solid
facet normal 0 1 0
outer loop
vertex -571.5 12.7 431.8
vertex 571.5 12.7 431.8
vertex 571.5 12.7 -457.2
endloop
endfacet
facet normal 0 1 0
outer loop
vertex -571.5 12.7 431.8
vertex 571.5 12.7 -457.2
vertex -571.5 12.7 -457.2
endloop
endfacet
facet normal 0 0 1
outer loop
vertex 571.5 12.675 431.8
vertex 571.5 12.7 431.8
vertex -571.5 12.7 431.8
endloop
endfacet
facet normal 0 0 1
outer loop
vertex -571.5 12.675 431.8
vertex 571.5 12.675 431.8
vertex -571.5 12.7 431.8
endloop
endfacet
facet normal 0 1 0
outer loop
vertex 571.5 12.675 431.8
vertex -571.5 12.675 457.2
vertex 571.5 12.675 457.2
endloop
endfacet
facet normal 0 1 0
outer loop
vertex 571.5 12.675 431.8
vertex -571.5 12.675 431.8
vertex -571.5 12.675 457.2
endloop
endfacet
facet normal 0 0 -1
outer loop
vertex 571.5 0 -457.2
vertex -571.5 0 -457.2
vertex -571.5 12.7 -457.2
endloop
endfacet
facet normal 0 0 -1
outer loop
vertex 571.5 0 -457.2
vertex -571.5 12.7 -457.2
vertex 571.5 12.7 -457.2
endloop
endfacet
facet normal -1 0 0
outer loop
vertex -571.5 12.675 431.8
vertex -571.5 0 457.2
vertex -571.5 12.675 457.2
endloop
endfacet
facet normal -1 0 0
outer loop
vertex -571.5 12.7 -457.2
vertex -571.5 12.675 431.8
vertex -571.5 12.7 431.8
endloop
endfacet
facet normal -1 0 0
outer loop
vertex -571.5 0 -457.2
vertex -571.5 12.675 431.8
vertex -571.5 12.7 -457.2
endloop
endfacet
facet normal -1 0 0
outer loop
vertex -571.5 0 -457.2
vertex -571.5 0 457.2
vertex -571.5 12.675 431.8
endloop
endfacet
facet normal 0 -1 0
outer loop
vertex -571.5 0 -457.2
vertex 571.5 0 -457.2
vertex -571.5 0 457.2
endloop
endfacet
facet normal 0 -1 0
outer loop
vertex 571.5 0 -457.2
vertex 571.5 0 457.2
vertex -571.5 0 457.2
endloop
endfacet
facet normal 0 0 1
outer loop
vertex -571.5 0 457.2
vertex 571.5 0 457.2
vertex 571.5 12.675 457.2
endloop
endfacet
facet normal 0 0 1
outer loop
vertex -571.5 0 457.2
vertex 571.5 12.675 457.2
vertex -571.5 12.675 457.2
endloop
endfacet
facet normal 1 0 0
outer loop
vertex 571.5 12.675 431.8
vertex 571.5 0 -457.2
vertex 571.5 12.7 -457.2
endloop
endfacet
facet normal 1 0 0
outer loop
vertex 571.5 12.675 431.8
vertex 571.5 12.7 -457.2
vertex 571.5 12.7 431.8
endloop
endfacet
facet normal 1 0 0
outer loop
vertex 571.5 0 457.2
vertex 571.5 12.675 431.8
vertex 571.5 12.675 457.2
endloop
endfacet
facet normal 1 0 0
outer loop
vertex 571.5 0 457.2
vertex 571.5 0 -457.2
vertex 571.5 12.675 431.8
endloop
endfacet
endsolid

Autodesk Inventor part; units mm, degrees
ref_plane "YZ Plane" through (0, 0, 0) normal (1, 0, 0) x (0, 1, 0)
ref_plane "XZ Plane" through (0, 0, 0) normal (0, 1, 0) x (-1, 0, 0)
ref_plane "XY Plane" through (0, 0, 0) normal (0, 0, 1) x (1, 0, 0)
sketch "Sketch1" plane through (0, 0, 0) normal (0, 1, 0) x (-1, 0, 0)
  line L0 (-571.5, 457.2) -> (571.5, 457.2)
  line L1 (571.5, 457.2) -> (571.5, -457.2)
  line L2 (571.5, -457.2) -> (-571.5, -457.2)
  line L3 (-571.5, -457.2) -> (-571.5, 457.2)
  line L4 (-571.5, 457.2) -> (571.5, -457.2) construction
  line L5 (571.5, 457.2) -> (-571.5, -457.2) construction
  point P0 (0, 0)
  dimension "d0" = 1143
  dimension "d1" = 914.4
extrude "Extrusion1" add sketch "Sketch1" along normal blind 12.7
sketch "Sketch2" plane through (0, 12.7, 0) normal (0, 1, 0) x (1, 0, 0)
  line L0 (-571.5, -457.2) -> (571.5, -457.2) projected
  line L1 (571.5, -457.2) -> (571.5, 457.2) projected
  line L2 (-571.5, -457.2) -> (571.5, -457.2)
  line L3 (571.5, -457.2) -> (571.5, -431.8)
  line L4 (571.5, -431.8) -> (-571.5, -431.8)
  line L5 (-571.5, -431.8) -> (-571.5, -457.2)
  point P0 (0, 0)
  dimension "d4" = 25.4
extrude "Extrusion2" cut sketch "Sketch2" against normal blind 0.0254
properties part number "floorLayer" material "Wood (Birch)"
